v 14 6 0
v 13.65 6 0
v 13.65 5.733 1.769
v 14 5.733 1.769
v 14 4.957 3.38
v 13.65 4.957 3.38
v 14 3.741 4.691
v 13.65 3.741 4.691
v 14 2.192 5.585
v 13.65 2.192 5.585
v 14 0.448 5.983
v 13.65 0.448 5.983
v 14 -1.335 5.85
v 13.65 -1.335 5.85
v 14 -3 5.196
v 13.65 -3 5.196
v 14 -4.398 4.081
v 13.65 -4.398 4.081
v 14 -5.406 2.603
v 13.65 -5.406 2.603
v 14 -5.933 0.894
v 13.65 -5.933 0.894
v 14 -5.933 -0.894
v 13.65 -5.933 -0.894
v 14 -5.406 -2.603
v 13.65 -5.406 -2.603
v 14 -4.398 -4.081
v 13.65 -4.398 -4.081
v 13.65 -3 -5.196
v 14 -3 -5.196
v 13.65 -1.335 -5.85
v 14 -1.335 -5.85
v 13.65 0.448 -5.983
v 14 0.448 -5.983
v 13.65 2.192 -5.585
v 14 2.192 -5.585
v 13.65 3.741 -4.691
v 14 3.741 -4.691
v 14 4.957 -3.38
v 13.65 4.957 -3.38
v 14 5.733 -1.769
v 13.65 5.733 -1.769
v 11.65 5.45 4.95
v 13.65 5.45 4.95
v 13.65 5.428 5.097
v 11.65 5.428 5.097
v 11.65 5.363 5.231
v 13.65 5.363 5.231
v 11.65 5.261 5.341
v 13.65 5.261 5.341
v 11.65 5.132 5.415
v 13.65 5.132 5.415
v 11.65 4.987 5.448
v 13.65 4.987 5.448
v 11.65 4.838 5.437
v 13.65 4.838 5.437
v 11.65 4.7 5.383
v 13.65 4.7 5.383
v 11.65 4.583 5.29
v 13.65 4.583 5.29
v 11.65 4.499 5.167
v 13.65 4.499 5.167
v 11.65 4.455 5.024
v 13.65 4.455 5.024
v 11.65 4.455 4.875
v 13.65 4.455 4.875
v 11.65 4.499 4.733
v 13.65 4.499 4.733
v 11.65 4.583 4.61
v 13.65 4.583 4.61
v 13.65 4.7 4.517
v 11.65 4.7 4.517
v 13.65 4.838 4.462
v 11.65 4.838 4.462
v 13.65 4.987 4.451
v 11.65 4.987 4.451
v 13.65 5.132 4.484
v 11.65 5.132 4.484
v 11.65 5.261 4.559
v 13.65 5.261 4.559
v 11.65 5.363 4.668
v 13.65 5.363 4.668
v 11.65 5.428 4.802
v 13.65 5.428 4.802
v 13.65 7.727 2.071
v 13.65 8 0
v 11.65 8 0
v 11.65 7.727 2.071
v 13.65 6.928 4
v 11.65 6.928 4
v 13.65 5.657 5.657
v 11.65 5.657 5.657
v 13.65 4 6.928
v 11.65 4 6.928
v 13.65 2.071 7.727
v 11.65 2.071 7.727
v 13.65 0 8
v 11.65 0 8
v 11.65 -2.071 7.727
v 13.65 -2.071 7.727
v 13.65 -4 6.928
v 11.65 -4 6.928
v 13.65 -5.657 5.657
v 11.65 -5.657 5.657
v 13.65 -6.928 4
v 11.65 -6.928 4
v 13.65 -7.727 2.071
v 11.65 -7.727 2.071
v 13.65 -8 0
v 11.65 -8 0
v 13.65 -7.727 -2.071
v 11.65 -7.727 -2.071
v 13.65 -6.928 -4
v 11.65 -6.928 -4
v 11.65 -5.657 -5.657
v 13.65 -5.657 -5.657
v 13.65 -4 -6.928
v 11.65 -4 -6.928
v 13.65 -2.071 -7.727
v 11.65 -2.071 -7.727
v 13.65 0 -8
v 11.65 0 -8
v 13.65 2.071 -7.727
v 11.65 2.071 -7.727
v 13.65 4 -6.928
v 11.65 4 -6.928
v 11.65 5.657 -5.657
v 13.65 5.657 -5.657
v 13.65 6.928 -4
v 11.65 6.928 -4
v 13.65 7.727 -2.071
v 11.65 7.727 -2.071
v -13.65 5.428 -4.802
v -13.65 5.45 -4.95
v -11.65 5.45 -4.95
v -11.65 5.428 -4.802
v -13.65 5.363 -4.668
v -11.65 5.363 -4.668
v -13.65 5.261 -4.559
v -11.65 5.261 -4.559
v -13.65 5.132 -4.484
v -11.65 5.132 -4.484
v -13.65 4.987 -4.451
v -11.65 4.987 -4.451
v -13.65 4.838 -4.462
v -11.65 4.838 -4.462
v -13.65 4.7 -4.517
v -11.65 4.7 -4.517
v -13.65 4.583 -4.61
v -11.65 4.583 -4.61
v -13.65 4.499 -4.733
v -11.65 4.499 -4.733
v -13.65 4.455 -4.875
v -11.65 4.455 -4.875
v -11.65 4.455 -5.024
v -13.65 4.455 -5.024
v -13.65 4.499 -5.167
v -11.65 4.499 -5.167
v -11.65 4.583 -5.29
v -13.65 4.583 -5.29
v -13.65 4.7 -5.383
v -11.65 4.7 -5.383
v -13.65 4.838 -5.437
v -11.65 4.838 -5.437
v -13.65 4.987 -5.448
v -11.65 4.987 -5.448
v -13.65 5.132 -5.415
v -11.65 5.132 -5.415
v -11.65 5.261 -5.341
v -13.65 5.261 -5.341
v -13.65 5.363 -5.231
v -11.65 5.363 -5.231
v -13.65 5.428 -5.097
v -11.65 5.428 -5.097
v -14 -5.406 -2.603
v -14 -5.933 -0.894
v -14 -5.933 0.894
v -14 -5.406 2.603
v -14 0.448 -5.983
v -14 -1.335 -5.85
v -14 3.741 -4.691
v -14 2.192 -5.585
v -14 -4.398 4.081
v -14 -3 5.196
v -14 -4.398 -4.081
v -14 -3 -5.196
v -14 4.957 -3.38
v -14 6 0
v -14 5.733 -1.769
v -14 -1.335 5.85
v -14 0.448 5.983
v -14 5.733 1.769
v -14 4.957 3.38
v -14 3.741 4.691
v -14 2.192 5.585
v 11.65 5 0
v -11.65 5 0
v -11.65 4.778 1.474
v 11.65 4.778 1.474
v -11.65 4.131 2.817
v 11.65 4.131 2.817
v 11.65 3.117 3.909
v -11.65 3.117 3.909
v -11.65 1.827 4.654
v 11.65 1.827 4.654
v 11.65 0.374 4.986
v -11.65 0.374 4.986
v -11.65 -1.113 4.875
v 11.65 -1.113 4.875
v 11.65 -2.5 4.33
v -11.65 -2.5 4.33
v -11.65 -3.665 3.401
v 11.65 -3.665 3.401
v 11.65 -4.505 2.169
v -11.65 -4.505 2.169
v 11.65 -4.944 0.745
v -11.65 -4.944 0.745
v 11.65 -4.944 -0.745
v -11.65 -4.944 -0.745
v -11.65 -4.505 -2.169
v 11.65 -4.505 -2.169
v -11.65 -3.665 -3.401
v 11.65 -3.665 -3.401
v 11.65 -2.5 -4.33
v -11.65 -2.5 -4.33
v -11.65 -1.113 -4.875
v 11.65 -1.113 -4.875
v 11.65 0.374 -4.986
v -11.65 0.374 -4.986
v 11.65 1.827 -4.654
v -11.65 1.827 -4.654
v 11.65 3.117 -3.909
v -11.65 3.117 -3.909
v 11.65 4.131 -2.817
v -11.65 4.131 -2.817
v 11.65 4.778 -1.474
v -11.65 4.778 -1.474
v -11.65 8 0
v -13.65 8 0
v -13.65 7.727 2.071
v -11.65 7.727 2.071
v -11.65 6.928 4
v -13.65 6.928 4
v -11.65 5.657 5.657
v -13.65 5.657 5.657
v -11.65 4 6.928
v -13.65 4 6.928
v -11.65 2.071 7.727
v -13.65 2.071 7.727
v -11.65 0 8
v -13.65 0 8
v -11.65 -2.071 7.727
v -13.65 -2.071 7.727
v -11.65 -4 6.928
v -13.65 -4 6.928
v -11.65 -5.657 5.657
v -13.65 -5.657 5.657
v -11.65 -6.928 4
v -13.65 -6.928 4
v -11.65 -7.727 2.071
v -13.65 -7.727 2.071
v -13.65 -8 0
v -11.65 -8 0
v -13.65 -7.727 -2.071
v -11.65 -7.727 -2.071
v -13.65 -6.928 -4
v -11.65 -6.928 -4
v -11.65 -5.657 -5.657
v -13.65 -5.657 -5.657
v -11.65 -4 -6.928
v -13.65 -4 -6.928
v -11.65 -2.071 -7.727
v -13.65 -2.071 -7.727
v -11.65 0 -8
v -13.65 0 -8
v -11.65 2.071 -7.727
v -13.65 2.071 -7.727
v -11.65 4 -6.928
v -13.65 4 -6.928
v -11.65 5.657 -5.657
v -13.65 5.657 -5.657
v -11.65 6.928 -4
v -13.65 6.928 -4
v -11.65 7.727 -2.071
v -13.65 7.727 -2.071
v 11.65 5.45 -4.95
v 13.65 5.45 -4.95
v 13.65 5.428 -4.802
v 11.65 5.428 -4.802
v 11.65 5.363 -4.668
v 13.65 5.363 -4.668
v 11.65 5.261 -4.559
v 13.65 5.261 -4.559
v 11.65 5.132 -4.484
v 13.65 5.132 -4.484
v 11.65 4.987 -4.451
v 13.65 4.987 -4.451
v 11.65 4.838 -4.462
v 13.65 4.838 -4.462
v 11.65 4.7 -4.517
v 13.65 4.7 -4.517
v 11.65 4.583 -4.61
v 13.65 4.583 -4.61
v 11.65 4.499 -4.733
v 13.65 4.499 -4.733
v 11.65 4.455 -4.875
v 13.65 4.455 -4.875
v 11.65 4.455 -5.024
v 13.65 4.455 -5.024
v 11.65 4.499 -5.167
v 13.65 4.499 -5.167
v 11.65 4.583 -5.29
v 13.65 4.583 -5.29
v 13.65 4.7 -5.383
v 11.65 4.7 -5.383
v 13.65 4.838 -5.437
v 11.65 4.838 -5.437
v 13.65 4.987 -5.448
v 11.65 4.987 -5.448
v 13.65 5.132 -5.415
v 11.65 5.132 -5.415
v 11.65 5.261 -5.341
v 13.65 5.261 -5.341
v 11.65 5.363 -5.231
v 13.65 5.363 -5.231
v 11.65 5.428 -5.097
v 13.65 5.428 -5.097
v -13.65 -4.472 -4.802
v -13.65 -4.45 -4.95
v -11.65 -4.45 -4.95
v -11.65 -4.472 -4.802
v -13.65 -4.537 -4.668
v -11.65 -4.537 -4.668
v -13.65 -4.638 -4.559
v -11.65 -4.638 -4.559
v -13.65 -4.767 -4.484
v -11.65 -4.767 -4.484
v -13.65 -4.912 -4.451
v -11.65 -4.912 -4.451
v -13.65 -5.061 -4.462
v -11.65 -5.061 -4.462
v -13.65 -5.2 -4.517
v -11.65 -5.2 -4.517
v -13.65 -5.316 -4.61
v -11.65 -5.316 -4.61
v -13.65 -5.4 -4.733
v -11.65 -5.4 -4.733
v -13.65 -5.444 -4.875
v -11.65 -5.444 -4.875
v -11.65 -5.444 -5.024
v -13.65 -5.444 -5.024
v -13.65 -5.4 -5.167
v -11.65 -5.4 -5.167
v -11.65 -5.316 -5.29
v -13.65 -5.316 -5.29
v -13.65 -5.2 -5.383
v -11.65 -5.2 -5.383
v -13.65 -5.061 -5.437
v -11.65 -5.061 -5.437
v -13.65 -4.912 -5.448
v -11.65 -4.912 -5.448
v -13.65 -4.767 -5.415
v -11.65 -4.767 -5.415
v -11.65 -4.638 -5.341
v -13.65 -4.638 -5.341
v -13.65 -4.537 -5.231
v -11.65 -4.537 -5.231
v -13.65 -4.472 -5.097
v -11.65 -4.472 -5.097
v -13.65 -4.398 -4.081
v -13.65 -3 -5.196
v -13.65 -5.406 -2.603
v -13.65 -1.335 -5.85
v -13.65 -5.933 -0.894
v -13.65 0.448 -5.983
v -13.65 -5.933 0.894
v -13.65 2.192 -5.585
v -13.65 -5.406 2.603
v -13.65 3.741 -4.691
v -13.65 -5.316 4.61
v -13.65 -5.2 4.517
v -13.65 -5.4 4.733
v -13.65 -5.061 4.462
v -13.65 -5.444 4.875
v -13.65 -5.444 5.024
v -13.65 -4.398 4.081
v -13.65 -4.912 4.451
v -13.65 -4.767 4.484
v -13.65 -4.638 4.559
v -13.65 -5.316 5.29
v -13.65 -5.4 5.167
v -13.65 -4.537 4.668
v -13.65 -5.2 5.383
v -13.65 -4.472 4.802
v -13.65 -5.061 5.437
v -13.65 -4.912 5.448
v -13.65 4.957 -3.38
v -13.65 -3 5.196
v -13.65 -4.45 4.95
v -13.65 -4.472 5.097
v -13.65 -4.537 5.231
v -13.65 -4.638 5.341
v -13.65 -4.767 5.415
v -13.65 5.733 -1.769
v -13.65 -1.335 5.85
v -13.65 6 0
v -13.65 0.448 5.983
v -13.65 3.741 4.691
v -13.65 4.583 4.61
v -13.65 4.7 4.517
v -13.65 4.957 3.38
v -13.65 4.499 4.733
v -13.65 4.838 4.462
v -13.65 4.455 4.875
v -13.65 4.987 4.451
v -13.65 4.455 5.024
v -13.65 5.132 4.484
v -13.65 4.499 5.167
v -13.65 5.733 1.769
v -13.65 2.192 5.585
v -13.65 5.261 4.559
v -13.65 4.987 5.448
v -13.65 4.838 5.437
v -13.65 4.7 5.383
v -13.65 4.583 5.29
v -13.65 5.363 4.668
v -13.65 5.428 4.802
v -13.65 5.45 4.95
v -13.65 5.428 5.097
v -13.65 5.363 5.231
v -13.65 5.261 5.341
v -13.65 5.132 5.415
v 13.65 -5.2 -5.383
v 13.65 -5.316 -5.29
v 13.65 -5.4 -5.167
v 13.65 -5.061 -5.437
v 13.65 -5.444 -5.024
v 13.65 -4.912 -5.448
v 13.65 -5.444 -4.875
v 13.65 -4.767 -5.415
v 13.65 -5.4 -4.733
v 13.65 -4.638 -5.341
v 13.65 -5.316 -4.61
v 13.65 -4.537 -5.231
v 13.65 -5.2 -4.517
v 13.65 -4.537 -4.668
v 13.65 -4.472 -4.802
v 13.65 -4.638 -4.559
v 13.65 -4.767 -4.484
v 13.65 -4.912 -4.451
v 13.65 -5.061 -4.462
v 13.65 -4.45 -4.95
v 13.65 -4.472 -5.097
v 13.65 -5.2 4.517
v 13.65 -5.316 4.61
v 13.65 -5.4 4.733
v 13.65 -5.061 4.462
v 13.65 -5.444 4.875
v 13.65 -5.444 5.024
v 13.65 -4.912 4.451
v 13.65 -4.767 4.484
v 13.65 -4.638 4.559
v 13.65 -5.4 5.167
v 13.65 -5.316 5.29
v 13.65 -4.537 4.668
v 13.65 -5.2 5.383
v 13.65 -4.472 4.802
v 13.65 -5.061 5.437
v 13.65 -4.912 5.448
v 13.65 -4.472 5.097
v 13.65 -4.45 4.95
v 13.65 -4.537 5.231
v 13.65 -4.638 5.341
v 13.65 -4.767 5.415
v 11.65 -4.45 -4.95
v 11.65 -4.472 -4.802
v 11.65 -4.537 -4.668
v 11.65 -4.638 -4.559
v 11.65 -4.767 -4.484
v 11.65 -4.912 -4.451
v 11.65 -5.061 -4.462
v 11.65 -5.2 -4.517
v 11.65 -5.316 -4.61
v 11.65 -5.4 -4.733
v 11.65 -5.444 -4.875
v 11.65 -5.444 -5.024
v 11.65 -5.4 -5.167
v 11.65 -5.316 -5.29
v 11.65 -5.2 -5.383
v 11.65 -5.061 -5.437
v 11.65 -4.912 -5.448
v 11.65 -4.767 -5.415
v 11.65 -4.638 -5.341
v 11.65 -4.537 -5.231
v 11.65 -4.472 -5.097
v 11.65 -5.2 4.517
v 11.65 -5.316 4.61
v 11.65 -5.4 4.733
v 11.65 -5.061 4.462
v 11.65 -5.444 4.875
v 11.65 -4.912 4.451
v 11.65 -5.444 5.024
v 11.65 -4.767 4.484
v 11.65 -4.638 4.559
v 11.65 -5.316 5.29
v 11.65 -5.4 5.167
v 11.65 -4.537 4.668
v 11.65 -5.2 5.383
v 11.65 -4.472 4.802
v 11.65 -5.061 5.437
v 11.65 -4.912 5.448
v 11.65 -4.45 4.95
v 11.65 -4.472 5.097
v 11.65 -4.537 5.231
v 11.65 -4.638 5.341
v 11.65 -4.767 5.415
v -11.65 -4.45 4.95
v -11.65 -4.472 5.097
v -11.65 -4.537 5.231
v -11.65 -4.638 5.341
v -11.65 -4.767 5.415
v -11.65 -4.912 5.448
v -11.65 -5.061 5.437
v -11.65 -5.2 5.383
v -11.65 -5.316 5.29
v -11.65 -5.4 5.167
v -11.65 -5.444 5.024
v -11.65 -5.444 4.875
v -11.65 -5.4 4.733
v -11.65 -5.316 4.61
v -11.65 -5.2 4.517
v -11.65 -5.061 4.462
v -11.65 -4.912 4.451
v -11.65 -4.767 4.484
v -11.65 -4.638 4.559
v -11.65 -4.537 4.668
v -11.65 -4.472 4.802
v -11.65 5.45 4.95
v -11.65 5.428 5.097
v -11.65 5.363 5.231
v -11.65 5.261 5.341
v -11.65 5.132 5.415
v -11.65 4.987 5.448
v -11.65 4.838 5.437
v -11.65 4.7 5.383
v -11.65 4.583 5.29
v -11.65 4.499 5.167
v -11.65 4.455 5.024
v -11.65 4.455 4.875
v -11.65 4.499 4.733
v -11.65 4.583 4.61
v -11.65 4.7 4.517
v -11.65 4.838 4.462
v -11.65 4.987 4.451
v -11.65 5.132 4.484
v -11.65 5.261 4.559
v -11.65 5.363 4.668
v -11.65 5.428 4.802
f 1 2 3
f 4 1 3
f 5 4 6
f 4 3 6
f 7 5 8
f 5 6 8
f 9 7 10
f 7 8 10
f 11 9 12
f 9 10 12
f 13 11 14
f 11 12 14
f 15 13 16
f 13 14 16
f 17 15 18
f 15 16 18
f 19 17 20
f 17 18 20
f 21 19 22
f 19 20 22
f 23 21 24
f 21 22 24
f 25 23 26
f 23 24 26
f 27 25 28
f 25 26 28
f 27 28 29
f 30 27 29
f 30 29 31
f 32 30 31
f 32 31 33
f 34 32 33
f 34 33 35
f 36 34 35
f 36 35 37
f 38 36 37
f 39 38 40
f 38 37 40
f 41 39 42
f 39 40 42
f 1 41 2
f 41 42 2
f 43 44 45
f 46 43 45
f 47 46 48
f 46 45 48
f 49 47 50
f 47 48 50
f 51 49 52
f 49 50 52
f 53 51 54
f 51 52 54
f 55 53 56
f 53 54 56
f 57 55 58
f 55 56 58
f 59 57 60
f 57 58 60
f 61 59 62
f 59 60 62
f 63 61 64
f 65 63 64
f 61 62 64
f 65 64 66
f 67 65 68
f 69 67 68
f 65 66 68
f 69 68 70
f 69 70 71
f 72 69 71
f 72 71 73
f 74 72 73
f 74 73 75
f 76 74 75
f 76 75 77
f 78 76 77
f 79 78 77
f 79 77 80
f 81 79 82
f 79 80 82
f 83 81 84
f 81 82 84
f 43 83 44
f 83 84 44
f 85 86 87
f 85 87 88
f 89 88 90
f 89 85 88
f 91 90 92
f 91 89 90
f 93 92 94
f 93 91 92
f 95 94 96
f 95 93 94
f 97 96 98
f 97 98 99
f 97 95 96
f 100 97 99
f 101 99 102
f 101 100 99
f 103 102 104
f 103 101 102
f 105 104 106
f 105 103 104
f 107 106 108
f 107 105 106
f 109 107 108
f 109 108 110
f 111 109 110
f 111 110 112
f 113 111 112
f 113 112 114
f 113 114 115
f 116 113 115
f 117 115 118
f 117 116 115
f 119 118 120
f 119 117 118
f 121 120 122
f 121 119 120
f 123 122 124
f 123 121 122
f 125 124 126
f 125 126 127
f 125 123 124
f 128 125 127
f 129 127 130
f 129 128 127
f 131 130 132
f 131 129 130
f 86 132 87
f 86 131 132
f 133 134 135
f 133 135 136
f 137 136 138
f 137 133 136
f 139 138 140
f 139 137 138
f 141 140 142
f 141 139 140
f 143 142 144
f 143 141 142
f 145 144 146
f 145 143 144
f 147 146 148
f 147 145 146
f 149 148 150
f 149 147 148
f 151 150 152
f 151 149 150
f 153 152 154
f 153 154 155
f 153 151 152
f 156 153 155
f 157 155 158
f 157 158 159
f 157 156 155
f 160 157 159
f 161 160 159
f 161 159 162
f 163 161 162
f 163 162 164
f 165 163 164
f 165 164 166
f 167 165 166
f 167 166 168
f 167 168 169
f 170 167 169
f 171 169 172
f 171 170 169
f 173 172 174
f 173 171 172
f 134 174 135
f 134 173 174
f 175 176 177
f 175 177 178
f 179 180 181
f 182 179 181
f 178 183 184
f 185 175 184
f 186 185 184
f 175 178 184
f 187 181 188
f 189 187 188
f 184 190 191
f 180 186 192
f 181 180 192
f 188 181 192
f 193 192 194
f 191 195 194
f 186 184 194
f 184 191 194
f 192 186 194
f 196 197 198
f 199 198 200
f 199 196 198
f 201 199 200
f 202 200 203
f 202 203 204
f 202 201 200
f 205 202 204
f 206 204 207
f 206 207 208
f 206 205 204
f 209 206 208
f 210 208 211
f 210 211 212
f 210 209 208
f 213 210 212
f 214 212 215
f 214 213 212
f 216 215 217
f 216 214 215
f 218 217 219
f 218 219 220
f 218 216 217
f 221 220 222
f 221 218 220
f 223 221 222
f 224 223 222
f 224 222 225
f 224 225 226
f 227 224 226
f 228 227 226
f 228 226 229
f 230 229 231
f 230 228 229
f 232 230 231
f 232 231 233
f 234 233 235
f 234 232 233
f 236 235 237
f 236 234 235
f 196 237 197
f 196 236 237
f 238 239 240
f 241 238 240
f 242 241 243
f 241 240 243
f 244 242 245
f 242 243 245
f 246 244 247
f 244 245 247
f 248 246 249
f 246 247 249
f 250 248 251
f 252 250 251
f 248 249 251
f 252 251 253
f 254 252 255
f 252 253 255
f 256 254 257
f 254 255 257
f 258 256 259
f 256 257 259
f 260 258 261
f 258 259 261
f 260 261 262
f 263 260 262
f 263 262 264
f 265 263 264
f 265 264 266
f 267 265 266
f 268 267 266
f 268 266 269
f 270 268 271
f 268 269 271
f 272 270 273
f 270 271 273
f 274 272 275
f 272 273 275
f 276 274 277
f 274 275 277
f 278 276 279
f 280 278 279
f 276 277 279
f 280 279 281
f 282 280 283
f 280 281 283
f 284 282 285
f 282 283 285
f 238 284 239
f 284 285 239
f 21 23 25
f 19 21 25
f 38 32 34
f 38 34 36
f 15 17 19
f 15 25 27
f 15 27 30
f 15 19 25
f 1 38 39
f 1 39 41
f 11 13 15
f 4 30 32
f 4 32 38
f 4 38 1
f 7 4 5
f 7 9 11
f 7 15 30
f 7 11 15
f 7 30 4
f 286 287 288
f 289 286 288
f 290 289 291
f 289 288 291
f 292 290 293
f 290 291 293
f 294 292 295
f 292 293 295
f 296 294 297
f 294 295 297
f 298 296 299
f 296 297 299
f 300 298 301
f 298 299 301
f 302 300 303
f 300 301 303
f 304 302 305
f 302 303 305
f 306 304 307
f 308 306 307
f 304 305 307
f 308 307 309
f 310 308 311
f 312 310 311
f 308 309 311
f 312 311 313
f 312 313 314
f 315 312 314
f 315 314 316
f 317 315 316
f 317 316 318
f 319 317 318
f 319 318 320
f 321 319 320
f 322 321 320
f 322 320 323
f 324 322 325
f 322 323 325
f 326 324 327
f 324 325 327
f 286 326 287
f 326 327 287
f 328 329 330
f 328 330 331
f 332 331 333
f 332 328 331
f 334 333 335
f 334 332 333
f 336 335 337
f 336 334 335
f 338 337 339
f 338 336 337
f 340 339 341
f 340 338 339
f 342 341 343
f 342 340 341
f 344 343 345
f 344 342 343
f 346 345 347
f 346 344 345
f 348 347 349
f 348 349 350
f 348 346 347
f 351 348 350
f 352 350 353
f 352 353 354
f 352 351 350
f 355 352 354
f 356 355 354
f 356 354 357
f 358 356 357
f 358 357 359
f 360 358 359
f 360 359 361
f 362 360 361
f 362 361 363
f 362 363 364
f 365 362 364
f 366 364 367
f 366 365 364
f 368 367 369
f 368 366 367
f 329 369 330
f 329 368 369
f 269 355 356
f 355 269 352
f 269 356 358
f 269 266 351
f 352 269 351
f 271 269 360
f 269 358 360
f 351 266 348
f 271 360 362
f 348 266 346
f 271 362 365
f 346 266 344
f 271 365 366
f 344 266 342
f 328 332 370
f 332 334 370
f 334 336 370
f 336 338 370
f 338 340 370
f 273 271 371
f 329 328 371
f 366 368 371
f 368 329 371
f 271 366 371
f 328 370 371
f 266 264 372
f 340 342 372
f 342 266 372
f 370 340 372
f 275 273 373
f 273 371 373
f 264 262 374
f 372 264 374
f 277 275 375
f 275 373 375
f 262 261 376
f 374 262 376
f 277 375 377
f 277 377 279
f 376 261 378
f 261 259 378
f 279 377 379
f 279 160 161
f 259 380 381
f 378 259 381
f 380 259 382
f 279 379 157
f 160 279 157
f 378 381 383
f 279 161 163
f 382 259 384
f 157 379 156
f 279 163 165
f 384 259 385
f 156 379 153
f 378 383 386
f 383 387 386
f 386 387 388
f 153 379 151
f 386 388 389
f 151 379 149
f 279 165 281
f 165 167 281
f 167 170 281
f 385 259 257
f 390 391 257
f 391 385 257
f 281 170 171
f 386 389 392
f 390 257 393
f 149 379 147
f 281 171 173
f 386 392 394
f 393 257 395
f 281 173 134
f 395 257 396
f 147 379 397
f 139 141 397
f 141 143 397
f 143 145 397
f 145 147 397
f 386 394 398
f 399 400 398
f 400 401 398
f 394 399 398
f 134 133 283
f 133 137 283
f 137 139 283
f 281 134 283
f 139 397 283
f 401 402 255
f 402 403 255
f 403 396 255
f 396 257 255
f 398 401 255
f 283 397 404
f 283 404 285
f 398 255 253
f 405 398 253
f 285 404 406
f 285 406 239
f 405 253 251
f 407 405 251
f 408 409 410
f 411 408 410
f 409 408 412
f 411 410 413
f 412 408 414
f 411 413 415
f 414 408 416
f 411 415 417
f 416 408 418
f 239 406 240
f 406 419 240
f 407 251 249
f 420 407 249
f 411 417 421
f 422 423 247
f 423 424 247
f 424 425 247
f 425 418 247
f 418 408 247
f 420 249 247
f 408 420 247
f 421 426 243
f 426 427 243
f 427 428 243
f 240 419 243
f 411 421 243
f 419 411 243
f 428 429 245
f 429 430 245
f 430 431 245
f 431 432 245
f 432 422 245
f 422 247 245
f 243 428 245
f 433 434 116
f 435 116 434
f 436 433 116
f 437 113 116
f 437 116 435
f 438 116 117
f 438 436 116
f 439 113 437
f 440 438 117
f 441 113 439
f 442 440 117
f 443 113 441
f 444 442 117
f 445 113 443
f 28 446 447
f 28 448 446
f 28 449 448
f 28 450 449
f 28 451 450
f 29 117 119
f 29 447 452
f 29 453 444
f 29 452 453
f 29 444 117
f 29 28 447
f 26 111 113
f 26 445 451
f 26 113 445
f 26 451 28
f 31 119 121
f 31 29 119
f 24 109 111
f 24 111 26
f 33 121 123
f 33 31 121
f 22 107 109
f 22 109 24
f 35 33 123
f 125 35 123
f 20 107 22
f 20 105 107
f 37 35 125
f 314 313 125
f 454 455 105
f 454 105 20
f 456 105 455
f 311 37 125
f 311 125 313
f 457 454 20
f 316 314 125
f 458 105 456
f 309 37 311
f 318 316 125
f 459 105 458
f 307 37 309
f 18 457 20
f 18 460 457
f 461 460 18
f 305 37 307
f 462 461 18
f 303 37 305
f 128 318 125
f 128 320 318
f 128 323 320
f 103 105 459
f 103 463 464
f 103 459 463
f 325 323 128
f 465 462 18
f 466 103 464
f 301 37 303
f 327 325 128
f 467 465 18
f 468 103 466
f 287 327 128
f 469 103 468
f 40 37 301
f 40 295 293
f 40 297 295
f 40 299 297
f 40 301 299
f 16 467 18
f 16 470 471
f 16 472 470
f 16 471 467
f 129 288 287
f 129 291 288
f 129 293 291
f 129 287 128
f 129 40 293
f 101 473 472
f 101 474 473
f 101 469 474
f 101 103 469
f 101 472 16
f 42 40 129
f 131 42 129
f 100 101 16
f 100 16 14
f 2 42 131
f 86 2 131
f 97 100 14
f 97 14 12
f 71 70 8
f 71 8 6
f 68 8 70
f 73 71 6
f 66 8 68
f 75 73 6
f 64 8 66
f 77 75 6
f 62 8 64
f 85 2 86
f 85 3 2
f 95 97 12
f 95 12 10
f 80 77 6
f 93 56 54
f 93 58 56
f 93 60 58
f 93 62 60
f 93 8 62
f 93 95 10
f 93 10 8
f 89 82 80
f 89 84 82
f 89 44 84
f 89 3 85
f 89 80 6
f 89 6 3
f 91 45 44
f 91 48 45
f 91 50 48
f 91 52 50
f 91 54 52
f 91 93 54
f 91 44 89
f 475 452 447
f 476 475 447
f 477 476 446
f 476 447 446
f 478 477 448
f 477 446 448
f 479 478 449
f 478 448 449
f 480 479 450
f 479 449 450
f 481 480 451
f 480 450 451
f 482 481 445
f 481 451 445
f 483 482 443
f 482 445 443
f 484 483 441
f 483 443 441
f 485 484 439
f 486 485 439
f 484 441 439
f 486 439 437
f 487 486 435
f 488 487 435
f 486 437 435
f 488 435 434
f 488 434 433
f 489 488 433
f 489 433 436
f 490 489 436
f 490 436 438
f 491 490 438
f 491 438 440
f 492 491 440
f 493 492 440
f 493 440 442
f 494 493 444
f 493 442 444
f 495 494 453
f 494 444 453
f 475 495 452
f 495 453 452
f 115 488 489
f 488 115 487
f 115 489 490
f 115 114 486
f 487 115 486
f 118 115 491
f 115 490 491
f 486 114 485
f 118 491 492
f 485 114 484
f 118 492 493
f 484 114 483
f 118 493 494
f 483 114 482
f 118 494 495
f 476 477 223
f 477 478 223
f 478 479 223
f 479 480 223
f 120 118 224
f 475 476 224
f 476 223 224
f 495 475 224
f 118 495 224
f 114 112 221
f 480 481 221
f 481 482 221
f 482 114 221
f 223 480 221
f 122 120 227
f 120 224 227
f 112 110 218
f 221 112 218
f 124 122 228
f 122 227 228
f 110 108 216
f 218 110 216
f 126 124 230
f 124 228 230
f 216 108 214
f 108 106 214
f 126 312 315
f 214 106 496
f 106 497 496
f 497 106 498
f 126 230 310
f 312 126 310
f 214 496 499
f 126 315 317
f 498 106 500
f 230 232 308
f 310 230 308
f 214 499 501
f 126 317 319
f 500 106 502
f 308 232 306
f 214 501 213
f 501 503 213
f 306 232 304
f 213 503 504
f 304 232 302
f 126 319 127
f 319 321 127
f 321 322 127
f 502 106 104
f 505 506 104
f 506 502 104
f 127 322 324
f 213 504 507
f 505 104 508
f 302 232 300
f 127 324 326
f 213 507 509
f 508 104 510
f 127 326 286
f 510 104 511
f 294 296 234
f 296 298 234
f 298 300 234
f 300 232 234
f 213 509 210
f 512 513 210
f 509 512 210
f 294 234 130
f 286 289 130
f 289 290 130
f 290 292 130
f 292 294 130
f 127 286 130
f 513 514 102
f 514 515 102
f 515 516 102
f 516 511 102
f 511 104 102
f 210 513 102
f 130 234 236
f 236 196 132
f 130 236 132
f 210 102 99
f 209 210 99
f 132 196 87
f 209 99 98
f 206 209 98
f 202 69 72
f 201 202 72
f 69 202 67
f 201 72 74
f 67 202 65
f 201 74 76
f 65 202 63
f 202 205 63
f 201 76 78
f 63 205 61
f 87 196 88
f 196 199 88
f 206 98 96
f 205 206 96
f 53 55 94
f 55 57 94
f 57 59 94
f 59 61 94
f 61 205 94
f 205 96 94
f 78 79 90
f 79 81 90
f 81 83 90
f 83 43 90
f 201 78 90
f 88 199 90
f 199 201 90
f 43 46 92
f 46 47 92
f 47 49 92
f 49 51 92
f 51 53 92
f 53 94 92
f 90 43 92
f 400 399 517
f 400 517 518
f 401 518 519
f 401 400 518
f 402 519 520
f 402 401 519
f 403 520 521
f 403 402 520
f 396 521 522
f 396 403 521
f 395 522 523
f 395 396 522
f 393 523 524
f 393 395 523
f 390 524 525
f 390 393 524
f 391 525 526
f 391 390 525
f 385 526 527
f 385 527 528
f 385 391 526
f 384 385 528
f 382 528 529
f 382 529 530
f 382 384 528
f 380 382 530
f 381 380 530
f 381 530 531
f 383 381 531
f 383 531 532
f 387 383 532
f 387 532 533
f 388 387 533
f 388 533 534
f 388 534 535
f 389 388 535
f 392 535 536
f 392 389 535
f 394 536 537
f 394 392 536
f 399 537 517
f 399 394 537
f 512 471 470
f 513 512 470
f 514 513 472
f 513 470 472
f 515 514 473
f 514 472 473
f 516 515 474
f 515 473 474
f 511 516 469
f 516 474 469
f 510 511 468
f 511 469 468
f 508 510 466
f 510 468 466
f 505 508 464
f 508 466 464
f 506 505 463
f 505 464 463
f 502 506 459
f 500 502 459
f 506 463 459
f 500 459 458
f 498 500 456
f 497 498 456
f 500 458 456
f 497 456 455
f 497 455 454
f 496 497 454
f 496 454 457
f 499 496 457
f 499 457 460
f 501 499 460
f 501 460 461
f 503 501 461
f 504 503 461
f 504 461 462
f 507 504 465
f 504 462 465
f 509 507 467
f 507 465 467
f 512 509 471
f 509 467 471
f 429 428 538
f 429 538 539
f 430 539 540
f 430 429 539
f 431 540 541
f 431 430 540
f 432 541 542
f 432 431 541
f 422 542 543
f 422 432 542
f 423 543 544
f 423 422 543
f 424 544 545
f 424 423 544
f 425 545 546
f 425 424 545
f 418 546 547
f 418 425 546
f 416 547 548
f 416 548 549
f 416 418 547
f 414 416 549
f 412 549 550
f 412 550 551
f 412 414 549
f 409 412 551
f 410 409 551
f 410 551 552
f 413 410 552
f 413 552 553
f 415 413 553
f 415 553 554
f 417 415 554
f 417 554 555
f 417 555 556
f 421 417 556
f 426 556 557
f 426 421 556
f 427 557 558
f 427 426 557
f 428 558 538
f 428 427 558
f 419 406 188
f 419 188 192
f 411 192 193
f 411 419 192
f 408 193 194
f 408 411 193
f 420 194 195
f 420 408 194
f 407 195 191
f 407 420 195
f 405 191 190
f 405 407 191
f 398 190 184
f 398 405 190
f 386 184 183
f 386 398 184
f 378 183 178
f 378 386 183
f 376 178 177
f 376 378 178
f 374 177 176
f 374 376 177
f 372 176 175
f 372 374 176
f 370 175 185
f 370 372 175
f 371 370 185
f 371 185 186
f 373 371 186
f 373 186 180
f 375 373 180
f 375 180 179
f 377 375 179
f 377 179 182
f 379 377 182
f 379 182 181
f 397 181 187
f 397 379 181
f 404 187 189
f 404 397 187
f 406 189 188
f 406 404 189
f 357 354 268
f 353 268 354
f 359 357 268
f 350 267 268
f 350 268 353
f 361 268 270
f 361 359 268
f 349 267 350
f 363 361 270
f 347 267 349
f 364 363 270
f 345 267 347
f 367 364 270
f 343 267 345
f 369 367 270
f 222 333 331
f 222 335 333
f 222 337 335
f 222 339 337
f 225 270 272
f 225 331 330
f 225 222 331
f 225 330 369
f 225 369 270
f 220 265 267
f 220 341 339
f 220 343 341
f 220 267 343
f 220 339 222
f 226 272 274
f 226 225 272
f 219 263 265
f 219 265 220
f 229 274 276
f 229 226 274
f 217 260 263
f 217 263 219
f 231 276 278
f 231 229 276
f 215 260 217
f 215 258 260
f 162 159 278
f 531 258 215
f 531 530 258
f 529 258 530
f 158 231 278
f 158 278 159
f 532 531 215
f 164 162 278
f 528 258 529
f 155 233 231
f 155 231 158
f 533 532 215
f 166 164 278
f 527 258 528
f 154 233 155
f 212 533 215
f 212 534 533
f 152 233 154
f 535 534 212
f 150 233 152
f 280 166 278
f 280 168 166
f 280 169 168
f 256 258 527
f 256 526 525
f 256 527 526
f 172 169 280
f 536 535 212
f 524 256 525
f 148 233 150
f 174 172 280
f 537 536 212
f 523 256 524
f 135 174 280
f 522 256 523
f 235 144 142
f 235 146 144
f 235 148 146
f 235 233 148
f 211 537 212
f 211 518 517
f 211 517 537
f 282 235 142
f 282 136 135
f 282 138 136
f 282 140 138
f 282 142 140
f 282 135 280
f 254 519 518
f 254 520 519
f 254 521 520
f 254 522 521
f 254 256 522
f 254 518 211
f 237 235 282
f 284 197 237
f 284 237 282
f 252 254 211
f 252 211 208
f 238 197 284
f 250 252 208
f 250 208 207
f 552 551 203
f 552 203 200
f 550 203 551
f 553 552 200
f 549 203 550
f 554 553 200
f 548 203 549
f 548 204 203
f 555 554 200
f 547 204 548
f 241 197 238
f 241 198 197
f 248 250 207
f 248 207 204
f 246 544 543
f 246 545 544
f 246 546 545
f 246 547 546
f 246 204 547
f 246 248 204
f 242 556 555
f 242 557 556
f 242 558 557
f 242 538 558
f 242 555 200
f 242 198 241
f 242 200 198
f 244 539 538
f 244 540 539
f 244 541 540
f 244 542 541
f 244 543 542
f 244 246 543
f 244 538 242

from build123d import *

# Parameters (mm, degrees)
SKETCH005_R     = 5
PAD002_DEPTH    = 14
SKETCH006_R     = 6
PAD003_DEPTH    = 0.35
SKETCH007_R     = 8
PAD004_DEPTH    = 2
SKETCH008_R     = 0.5
POCKET003_DEPTH = 2


with BuildPart() as part:
    # Sketch005 → Pad002 (new body, symmetric)
    with BuildSketch(Plane.YZ):
        Circle(SKETCH005_R)
    extrude(amount=PAD002_DEPTH, both=True)

    # Sketch006 (on DatumPlane) → Pad003 (new body)
    with BuildSketch(Plane.YZ.offset(13.65)):
        Circle(SKETCH006_R)
    pad003 = extrude(amount=PAD003_DEPTH)

    # Mirrored: Pad003 across YZ
    add(pad003.mirror(Plane.YZ))

    # Sketch007 (on DatumPlane) → Pad004 (new body)
    with BuildSketch(Plane.YZ.offset(13.65)):
        Circle(SKETCH007_R)
    pad004 = extrude(amount=-PAD004_DEPTH)

    # Mirrored001: Pad004 across YZ
    add(pad004.mirror(Plane.YZ))

    # Sketch008 (on DatumPlane) → Pocket003 (cut)
    with BuildSketch(Plane.YZ.offset(13.65)):
        with Locations((-4.949747, 4.949747)):
            Circle(SKETCH008_R)
        with Locations((4.949747, 4.949747)):
            Circle(SKETCH008_R)
        with Locations((4.949747, -4.949747)):
            Circle(SKETCH008_R)
        with Locations((-4.949747, -4.949747)):
            Circle(SKETCH008_R)
    pocket003 = extrude(amount=-POCKET003_DEPTH, mode=Mode.SUBTRACT)

    # Mirrored002: Pocket003 across YZ
    add(pocket003.mirror(Plane.YZ), mode=Mode.SUBTRACT)


solid = part.part
